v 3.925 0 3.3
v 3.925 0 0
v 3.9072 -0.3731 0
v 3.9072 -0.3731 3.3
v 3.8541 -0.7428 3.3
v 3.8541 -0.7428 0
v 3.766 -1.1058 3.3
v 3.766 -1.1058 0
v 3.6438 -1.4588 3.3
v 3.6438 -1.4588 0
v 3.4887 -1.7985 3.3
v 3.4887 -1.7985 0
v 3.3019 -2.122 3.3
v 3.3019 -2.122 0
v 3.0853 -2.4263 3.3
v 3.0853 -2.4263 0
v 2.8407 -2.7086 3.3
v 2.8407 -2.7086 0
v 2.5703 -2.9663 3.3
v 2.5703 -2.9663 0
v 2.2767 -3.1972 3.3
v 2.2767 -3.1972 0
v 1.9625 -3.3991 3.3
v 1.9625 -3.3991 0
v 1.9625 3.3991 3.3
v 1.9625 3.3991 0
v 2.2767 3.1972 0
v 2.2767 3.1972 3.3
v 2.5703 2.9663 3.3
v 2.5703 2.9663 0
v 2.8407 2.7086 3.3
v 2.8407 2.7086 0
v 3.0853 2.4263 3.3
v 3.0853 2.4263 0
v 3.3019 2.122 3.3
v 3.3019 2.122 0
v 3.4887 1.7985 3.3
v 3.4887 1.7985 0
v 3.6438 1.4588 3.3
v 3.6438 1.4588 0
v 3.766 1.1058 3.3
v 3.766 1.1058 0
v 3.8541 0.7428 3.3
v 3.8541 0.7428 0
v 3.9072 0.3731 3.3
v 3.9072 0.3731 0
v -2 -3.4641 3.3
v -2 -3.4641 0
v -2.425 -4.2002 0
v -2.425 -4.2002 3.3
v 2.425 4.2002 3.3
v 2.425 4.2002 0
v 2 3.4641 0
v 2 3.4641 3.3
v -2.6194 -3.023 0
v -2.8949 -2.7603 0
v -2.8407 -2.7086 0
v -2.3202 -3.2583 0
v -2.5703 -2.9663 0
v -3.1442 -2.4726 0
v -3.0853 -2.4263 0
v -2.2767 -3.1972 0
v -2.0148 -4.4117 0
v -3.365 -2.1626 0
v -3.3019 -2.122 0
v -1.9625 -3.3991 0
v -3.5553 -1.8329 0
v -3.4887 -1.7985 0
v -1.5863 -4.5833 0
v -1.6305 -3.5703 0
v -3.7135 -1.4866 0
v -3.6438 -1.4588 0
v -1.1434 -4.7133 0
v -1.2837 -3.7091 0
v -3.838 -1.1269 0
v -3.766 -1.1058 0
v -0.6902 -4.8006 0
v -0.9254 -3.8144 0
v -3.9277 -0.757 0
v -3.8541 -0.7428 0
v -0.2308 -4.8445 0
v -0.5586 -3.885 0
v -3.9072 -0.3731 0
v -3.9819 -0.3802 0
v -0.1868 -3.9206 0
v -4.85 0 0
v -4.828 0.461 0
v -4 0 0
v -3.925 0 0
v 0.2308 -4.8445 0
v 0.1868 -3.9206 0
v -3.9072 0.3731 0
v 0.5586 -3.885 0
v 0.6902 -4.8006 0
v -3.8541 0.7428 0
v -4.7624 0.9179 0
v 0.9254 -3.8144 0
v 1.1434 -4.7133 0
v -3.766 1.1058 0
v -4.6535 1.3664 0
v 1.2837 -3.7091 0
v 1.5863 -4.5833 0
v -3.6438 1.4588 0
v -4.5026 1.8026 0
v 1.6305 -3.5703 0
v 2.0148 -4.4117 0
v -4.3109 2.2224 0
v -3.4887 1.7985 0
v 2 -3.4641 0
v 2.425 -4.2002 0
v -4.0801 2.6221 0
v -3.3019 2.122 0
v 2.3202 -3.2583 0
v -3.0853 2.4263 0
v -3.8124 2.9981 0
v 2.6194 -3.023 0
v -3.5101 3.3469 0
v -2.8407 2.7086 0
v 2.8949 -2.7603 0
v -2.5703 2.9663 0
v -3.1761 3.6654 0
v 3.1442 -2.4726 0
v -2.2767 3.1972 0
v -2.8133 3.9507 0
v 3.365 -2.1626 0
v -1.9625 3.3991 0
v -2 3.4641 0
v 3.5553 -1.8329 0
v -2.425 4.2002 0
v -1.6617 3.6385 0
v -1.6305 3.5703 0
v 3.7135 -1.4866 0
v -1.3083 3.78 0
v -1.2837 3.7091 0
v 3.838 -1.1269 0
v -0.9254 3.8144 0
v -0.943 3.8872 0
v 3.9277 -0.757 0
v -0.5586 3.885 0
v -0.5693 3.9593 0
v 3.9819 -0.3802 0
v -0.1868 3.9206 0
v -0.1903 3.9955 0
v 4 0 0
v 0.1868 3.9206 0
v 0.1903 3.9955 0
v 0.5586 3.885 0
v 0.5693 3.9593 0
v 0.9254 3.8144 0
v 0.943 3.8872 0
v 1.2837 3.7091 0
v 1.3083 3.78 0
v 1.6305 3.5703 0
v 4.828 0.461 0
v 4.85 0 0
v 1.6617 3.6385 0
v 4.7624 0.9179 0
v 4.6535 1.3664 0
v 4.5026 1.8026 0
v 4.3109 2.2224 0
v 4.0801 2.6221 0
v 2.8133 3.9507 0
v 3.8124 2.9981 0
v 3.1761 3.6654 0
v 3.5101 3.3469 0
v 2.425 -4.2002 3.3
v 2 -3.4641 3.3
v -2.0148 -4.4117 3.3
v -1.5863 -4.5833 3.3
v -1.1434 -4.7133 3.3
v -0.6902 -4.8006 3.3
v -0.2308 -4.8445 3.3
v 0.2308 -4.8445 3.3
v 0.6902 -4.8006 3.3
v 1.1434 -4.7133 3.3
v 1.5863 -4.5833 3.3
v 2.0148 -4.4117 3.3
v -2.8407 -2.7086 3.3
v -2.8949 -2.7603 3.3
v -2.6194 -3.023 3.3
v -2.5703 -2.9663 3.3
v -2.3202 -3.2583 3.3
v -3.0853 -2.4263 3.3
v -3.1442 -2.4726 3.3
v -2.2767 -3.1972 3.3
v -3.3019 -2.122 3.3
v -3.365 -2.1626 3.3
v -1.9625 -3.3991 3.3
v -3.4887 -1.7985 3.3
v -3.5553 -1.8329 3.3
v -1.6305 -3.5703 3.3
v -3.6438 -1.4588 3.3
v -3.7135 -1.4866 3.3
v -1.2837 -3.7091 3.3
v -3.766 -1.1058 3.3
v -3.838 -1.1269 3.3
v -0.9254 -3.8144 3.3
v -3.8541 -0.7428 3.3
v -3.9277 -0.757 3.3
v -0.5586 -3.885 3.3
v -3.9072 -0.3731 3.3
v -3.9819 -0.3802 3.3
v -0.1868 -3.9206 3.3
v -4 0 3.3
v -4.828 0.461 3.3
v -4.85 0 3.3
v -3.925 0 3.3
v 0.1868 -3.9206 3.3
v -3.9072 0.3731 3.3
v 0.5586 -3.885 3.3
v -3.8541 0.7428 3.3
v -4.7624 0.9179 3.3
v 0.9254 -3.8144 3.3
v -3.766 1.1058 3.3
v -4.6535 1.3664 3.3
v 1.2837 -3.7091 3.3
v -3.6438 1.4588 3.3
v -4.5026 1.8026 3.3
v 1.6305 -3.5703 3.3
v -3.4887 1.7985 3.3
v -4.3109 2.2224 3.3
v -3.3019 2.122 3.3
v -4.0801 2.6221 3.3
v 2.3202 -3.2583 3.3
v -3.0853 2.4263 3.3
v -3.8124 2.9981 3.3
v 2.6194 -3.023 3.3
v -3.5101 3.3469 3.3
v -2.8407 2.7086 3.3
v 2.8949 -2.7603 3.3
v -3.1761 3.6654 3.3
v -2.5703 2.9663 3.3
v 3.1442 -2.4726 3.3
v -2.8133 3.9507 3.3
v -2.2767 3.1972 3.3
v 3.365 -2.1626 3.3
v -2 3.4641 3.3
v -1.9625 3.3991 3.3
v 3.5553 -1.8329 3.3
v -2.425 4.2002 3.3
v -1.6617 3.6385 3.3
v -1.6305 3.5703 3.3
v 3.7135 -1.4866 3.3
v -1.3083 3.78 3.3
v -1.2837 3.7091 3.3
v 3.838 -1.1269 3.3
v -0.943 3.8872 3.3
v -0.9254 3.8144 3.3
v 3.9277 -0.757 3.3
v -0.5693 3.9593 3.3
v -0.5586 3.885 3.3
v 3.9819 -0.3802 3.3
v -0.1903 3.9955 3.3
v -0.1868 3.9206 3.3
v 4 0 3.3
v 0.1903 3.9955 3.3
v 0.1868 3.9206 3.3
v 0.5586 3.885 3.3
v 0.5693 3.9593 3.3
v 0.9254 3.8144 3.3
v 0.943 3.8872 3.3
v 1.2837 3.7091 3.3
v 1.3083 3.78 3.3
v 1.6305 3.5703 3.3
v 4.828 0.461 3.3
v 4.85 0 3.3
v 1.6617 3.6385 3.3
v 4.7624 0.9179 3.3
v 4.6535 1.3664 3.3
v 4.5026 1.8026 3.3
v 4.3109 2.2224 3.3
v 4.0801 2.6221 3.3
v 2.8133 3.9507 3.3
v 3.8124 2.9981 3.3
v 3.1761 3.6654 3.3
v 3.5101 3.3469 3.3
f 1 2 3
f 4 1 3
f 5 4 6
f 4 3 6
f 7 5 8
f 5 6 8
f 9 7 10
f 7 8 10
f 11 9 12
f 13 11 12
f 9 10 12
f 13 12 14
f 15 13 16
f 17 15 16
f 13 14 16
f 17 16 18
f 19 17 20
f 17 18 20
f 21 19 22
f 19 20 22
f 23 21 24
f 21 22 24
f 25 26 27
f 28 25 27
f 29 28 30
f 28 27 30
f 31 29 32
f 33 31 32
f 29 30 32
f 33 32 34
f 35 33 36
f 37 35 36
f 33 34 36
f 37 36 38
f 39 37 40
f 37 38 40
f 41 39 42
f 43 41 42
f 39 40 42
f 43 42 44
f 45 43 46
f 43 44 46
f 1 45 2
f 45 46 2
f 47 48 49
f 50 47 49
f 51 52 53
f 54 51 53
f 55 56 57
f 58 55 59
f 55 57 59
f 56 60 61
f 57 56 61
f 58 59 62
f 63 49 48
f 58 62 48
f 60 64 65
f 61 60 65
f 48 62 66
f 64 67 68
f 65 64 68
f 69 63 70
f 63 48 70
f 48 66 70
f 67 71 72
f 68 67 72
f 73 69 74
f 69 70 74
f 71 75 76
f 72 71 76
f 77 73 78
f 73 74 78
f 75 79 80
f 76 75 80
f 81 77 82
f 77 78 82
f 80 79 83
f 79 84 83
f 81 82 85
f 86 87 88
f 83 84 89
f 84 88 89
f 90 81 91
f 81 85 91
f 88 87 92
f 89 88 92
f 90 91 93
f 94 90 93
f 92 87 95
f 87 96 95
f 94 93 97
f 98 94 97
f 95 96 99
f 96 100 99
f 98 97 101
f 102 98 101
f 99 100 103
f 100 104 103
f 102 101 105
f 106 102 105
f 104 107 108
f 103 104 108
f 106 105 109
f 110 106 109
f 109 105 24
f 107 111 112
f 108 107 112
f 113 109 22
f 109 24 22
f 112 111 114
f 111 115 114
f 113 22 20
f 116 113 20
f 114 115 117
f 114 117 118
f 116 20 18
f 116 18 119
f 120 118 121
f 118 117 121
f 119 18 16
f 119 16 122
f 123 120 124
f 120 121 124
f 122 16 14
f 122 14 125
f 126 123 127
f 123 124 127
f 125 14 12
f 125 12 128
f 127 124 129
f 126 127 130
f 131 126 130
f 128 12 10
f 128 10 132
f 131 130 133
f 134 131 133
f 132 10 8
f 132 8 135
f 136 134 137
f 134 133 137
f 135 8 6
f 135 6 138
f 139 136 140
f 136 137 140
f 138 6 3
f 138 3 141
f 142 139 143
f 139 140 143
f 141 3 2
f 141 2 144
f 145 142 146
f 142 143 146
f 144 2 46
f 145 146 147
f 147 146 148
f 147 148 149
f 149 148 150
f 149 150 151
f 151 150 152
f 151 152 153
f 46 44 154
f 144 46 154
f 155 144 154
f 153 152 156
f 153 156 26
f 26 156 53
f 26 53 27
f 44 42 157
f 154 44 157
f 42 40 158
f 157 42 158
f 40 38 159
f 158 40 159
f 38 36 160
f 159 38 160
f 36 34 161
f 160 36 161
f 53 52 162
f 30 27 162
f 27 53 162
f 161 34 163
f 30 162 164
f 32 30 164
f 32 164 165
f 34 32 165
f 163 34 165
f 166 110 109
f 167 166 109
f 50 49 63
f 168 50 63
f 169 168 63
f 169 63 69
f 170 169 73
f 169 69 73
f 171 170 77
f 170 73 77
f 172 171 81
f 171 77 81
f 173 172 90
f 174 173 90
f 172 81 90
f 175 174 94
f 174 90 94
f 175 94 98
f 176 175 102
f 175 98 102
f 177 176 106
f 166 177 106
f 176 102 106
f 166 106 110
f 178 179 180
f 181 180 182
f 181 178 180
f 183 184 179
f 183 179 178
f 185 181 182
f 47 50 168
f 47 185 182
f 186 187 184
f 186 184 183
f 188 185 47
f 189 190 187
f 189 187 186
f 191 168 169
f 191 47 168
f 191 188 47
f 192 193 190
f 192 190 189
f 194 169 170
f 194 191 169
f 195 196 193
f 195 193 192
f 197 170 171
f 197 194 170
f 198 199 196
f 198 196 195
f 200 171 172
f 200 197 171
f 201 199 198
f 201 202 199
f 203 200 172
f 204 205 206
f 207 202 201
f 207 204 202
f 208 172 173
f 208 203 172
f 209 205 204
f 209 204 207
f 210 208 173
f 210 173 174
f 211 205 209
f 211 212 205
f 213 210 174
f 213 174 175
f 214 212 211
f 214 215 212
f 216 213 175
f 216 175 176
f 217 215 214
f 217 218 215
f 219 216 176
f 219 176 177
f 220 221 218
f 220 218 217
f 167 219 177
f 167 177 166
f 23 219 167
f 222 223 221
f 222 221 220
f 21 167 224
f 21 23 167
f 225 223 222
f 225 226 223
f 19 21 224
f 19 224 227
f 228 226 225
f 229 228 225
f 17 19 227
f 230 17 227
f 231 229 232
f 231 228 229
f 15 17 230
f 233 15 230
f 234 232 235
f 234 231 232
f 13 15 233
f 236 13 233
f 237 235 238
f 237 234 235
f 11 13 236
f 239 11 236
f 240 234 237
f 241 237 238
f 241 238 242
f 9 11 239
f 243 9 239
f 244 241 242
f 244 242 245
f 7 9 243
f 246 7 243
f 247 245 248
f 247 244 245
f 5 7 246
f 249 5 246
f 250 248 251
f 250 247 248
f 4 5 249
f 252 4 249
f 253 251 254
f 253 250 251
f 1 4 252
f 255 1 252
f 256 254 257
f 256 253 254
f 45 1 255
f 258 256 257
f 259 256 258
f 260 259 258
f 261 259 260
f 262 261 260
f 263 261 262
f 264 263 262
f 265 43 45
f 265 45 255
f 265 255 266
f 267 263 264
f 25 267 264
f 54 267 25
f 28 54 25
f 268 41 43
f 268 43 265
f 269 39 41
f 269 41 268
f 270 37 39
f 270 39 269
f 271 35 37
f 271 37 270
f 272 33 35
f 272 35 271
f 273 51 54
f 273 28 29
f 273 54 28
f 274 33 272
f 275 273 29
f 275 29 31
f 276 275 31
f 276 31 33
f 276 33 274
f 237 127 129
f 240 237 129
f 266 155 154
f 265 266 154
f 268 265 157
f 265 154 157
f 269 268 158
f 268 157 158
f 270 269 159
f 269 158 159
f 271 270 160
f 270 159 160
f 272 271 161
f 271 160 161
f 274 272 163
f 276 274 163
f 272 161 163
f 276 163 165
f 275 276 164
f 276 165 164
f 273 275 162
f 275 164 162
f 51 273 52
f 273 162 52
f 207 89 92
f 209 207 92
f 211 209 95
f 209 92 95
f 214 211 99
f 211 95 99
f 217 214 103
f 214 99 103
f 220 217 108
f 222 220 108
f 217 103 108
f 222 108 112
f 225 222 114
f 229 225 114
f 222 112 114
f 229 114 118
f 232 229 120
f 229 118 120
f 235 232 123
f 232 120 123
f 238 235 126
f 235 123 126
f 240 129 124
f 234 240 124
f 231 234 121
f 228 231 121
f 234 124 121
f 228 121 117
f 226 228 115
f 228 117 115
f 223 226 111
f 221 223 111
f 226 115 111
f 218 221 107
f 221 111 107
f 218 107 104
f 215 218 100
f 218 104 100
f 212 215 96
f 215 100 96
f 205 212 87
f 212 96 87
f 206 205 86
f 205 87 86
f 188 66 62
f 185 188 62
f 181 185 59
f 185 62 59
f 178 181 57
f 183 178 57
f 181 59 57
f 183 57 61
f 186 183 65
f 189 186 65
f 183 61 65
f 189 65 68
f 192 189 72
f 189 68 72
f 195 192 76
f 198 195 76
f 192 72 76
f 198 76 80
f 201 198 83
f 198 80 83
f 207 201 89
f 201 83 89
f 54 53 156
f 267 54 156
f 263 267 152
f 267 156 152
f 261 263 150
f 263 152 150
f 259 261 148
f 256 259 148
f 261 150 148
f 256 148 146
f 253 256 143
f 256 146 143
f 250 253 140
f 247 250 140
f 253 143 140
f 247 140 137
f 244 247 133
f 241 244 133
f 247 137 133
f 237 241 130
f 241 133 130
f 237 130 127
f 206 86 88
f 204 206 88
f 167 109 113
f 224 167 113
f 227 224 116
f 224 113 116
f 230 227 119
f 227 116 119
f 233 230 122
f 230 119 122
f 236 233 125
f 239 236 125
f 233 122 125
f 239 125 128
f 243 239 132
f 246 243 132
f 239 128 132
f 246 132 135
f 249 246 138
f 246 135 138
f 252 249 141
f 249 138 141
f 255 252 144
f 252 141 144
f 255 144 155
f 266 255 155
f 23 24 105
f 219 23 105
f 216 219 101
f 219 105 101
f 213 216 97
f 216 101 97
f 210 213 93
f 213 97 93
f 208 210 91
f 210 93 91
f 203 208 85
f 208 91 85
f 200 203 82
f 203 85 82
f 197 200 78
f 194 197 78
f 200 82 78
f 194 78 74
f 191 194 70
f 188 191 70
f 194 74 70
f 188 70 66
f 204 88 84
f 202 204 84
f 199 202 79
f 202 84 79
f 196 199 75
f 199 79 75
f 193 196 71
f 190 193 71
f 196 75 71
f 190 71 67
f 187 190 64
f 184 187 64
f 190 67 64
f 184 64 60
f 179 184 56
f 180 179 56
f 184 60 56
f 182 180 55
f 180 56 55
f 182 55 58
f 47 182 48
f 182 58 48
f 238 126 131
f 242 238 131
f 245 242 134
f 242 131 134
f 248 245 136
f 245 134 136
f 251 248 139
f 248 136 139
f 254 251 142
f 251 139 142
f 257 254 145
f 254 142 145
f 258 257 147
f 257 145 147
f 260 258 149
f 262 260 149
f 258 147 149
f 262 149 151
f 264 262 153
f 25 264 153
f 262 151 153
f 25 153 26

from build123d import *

# Parameters (mm, degrees)
F1_DEPTH = 3.3


with BuildPart() as f1:
    # F0 (on Top) → F1 (new body)
    with BuildSketch(Plane.XY):
        with BuildLine():
            ThreePointArc((2, 3.4641016151), (3.4641016151, 2), (4, 0))
            Line((4, 0), (4.85, 0))
            ThreePointArc((4.85, 0), (4.2002232084, 2.425), (2.425, 4.2002232084))
            Line((2.425, 4.2002232084), (2, 3.4641016151))
        make_face()
        with BuildLine():
            ThreePointArc((1.9625, 3.3991497099), (3.3991497099, 1.9625), (3.925, 0))
            Line((3.925, 0), (4, 0))
            ThreePointArc((4, 0), (3.4641016151, 2), (2, 3.4641016151))
            Line((2, 3.4641016151), (1.9625, 3.3991497099))
        make_face()
        with BuildLine():
            ThreePointArc((-1.9625, 3.3991497099), (0, 3.925), (1.9625, 3.3991497099))
            Line((1.9625, 3.3991497099), (2, 3.4641016151))
            ThreePointArc((2, 3.4641016151), (0, 4), (-2, 3.4641016151))
            Line((-2, 3.4641016151), (-1.9625, 3.3991497099))
        make_face()
        with BuildLine():
            ThreePointArc((-3.925, 0), (-3.3991497099, 1.9625), (-1.9625, 3.3991497099))
            Line((-1.9625, 3.3991497099), (-2, 3.4641016151))
            ThreePointArc((-2, 3.4641016151), (-3.4641016151, 2), (-4, 0))
            Line((-4, 0), (-3.925, 0))
        make_face()
        with BuildLine():
            ThreePointArc((-4, 0), (-3.4641016151, 2), (-2, 3.4641016151))
            Line((-2, 3.4641016151), (-2.425, 4.2002232084))
            ThreePointArc((-2.425, 4.2002232084), (-4.2002232084, 2.425), (-4.85, 0))
            Line((-4.85, 0), (-4, 0))
        make_face()
        with BuildLine():
            Line((-2, -3.4641016151), (-1.9625, -3.3991497099))
            ThreePointArc((-1.9625, -3.3991497099), (-3.3991497099, -1.9625), (-3.925, 0))
            Line((-3.925, 0), (-4, 0))
            ThreePointArc((-4, 0), (-3.4641016151, -2), (-2, -3.4641016151))
        make_face()
        with BuildLine():
            Line((2.425, -4.2002232084), (2, -3.4641016151))
            ThreePointArc((2, -3.4641016151), (0, -4), (-2, -3.4641016151))
            Line((-2, -3.4641016151), (-2.425, -4.2002232084))
            ThreePointArc((-2.425, -4.2002232084), (0, -4.85), (2.425, -4.2002232084))
        make_face()
        with BuildLine():
            Line((2, -3.4641016151), (1.9625, -3.3991497099))
            ThreePointArc((1.9625, -3.3991497099), (0, -3.925), (-1.9625, -3.3991497099))
            Line((-1.9625, -3.3991497099), (-2, -3.4641016151))
            ThreePointArc((-2, -3.4641016151), (0, -4), (2, -3.4641016151))
        make_face()
        with BuildLine():
            Line((4, 0), (3.925, 0))
            ThreePointArc((3.925, 0), (3.3991497099, -1.9625), (1.9625, -3.3991497099))
            Line((1.9625, -3.3991497099), (2, -3.4641016151))
            ThreePointArc((2, -3.4641016151), (3.4641016151, -2), (4, 0))
        make_face()
    extrude(amount=F1_DEPTH)


solid = f1.part
